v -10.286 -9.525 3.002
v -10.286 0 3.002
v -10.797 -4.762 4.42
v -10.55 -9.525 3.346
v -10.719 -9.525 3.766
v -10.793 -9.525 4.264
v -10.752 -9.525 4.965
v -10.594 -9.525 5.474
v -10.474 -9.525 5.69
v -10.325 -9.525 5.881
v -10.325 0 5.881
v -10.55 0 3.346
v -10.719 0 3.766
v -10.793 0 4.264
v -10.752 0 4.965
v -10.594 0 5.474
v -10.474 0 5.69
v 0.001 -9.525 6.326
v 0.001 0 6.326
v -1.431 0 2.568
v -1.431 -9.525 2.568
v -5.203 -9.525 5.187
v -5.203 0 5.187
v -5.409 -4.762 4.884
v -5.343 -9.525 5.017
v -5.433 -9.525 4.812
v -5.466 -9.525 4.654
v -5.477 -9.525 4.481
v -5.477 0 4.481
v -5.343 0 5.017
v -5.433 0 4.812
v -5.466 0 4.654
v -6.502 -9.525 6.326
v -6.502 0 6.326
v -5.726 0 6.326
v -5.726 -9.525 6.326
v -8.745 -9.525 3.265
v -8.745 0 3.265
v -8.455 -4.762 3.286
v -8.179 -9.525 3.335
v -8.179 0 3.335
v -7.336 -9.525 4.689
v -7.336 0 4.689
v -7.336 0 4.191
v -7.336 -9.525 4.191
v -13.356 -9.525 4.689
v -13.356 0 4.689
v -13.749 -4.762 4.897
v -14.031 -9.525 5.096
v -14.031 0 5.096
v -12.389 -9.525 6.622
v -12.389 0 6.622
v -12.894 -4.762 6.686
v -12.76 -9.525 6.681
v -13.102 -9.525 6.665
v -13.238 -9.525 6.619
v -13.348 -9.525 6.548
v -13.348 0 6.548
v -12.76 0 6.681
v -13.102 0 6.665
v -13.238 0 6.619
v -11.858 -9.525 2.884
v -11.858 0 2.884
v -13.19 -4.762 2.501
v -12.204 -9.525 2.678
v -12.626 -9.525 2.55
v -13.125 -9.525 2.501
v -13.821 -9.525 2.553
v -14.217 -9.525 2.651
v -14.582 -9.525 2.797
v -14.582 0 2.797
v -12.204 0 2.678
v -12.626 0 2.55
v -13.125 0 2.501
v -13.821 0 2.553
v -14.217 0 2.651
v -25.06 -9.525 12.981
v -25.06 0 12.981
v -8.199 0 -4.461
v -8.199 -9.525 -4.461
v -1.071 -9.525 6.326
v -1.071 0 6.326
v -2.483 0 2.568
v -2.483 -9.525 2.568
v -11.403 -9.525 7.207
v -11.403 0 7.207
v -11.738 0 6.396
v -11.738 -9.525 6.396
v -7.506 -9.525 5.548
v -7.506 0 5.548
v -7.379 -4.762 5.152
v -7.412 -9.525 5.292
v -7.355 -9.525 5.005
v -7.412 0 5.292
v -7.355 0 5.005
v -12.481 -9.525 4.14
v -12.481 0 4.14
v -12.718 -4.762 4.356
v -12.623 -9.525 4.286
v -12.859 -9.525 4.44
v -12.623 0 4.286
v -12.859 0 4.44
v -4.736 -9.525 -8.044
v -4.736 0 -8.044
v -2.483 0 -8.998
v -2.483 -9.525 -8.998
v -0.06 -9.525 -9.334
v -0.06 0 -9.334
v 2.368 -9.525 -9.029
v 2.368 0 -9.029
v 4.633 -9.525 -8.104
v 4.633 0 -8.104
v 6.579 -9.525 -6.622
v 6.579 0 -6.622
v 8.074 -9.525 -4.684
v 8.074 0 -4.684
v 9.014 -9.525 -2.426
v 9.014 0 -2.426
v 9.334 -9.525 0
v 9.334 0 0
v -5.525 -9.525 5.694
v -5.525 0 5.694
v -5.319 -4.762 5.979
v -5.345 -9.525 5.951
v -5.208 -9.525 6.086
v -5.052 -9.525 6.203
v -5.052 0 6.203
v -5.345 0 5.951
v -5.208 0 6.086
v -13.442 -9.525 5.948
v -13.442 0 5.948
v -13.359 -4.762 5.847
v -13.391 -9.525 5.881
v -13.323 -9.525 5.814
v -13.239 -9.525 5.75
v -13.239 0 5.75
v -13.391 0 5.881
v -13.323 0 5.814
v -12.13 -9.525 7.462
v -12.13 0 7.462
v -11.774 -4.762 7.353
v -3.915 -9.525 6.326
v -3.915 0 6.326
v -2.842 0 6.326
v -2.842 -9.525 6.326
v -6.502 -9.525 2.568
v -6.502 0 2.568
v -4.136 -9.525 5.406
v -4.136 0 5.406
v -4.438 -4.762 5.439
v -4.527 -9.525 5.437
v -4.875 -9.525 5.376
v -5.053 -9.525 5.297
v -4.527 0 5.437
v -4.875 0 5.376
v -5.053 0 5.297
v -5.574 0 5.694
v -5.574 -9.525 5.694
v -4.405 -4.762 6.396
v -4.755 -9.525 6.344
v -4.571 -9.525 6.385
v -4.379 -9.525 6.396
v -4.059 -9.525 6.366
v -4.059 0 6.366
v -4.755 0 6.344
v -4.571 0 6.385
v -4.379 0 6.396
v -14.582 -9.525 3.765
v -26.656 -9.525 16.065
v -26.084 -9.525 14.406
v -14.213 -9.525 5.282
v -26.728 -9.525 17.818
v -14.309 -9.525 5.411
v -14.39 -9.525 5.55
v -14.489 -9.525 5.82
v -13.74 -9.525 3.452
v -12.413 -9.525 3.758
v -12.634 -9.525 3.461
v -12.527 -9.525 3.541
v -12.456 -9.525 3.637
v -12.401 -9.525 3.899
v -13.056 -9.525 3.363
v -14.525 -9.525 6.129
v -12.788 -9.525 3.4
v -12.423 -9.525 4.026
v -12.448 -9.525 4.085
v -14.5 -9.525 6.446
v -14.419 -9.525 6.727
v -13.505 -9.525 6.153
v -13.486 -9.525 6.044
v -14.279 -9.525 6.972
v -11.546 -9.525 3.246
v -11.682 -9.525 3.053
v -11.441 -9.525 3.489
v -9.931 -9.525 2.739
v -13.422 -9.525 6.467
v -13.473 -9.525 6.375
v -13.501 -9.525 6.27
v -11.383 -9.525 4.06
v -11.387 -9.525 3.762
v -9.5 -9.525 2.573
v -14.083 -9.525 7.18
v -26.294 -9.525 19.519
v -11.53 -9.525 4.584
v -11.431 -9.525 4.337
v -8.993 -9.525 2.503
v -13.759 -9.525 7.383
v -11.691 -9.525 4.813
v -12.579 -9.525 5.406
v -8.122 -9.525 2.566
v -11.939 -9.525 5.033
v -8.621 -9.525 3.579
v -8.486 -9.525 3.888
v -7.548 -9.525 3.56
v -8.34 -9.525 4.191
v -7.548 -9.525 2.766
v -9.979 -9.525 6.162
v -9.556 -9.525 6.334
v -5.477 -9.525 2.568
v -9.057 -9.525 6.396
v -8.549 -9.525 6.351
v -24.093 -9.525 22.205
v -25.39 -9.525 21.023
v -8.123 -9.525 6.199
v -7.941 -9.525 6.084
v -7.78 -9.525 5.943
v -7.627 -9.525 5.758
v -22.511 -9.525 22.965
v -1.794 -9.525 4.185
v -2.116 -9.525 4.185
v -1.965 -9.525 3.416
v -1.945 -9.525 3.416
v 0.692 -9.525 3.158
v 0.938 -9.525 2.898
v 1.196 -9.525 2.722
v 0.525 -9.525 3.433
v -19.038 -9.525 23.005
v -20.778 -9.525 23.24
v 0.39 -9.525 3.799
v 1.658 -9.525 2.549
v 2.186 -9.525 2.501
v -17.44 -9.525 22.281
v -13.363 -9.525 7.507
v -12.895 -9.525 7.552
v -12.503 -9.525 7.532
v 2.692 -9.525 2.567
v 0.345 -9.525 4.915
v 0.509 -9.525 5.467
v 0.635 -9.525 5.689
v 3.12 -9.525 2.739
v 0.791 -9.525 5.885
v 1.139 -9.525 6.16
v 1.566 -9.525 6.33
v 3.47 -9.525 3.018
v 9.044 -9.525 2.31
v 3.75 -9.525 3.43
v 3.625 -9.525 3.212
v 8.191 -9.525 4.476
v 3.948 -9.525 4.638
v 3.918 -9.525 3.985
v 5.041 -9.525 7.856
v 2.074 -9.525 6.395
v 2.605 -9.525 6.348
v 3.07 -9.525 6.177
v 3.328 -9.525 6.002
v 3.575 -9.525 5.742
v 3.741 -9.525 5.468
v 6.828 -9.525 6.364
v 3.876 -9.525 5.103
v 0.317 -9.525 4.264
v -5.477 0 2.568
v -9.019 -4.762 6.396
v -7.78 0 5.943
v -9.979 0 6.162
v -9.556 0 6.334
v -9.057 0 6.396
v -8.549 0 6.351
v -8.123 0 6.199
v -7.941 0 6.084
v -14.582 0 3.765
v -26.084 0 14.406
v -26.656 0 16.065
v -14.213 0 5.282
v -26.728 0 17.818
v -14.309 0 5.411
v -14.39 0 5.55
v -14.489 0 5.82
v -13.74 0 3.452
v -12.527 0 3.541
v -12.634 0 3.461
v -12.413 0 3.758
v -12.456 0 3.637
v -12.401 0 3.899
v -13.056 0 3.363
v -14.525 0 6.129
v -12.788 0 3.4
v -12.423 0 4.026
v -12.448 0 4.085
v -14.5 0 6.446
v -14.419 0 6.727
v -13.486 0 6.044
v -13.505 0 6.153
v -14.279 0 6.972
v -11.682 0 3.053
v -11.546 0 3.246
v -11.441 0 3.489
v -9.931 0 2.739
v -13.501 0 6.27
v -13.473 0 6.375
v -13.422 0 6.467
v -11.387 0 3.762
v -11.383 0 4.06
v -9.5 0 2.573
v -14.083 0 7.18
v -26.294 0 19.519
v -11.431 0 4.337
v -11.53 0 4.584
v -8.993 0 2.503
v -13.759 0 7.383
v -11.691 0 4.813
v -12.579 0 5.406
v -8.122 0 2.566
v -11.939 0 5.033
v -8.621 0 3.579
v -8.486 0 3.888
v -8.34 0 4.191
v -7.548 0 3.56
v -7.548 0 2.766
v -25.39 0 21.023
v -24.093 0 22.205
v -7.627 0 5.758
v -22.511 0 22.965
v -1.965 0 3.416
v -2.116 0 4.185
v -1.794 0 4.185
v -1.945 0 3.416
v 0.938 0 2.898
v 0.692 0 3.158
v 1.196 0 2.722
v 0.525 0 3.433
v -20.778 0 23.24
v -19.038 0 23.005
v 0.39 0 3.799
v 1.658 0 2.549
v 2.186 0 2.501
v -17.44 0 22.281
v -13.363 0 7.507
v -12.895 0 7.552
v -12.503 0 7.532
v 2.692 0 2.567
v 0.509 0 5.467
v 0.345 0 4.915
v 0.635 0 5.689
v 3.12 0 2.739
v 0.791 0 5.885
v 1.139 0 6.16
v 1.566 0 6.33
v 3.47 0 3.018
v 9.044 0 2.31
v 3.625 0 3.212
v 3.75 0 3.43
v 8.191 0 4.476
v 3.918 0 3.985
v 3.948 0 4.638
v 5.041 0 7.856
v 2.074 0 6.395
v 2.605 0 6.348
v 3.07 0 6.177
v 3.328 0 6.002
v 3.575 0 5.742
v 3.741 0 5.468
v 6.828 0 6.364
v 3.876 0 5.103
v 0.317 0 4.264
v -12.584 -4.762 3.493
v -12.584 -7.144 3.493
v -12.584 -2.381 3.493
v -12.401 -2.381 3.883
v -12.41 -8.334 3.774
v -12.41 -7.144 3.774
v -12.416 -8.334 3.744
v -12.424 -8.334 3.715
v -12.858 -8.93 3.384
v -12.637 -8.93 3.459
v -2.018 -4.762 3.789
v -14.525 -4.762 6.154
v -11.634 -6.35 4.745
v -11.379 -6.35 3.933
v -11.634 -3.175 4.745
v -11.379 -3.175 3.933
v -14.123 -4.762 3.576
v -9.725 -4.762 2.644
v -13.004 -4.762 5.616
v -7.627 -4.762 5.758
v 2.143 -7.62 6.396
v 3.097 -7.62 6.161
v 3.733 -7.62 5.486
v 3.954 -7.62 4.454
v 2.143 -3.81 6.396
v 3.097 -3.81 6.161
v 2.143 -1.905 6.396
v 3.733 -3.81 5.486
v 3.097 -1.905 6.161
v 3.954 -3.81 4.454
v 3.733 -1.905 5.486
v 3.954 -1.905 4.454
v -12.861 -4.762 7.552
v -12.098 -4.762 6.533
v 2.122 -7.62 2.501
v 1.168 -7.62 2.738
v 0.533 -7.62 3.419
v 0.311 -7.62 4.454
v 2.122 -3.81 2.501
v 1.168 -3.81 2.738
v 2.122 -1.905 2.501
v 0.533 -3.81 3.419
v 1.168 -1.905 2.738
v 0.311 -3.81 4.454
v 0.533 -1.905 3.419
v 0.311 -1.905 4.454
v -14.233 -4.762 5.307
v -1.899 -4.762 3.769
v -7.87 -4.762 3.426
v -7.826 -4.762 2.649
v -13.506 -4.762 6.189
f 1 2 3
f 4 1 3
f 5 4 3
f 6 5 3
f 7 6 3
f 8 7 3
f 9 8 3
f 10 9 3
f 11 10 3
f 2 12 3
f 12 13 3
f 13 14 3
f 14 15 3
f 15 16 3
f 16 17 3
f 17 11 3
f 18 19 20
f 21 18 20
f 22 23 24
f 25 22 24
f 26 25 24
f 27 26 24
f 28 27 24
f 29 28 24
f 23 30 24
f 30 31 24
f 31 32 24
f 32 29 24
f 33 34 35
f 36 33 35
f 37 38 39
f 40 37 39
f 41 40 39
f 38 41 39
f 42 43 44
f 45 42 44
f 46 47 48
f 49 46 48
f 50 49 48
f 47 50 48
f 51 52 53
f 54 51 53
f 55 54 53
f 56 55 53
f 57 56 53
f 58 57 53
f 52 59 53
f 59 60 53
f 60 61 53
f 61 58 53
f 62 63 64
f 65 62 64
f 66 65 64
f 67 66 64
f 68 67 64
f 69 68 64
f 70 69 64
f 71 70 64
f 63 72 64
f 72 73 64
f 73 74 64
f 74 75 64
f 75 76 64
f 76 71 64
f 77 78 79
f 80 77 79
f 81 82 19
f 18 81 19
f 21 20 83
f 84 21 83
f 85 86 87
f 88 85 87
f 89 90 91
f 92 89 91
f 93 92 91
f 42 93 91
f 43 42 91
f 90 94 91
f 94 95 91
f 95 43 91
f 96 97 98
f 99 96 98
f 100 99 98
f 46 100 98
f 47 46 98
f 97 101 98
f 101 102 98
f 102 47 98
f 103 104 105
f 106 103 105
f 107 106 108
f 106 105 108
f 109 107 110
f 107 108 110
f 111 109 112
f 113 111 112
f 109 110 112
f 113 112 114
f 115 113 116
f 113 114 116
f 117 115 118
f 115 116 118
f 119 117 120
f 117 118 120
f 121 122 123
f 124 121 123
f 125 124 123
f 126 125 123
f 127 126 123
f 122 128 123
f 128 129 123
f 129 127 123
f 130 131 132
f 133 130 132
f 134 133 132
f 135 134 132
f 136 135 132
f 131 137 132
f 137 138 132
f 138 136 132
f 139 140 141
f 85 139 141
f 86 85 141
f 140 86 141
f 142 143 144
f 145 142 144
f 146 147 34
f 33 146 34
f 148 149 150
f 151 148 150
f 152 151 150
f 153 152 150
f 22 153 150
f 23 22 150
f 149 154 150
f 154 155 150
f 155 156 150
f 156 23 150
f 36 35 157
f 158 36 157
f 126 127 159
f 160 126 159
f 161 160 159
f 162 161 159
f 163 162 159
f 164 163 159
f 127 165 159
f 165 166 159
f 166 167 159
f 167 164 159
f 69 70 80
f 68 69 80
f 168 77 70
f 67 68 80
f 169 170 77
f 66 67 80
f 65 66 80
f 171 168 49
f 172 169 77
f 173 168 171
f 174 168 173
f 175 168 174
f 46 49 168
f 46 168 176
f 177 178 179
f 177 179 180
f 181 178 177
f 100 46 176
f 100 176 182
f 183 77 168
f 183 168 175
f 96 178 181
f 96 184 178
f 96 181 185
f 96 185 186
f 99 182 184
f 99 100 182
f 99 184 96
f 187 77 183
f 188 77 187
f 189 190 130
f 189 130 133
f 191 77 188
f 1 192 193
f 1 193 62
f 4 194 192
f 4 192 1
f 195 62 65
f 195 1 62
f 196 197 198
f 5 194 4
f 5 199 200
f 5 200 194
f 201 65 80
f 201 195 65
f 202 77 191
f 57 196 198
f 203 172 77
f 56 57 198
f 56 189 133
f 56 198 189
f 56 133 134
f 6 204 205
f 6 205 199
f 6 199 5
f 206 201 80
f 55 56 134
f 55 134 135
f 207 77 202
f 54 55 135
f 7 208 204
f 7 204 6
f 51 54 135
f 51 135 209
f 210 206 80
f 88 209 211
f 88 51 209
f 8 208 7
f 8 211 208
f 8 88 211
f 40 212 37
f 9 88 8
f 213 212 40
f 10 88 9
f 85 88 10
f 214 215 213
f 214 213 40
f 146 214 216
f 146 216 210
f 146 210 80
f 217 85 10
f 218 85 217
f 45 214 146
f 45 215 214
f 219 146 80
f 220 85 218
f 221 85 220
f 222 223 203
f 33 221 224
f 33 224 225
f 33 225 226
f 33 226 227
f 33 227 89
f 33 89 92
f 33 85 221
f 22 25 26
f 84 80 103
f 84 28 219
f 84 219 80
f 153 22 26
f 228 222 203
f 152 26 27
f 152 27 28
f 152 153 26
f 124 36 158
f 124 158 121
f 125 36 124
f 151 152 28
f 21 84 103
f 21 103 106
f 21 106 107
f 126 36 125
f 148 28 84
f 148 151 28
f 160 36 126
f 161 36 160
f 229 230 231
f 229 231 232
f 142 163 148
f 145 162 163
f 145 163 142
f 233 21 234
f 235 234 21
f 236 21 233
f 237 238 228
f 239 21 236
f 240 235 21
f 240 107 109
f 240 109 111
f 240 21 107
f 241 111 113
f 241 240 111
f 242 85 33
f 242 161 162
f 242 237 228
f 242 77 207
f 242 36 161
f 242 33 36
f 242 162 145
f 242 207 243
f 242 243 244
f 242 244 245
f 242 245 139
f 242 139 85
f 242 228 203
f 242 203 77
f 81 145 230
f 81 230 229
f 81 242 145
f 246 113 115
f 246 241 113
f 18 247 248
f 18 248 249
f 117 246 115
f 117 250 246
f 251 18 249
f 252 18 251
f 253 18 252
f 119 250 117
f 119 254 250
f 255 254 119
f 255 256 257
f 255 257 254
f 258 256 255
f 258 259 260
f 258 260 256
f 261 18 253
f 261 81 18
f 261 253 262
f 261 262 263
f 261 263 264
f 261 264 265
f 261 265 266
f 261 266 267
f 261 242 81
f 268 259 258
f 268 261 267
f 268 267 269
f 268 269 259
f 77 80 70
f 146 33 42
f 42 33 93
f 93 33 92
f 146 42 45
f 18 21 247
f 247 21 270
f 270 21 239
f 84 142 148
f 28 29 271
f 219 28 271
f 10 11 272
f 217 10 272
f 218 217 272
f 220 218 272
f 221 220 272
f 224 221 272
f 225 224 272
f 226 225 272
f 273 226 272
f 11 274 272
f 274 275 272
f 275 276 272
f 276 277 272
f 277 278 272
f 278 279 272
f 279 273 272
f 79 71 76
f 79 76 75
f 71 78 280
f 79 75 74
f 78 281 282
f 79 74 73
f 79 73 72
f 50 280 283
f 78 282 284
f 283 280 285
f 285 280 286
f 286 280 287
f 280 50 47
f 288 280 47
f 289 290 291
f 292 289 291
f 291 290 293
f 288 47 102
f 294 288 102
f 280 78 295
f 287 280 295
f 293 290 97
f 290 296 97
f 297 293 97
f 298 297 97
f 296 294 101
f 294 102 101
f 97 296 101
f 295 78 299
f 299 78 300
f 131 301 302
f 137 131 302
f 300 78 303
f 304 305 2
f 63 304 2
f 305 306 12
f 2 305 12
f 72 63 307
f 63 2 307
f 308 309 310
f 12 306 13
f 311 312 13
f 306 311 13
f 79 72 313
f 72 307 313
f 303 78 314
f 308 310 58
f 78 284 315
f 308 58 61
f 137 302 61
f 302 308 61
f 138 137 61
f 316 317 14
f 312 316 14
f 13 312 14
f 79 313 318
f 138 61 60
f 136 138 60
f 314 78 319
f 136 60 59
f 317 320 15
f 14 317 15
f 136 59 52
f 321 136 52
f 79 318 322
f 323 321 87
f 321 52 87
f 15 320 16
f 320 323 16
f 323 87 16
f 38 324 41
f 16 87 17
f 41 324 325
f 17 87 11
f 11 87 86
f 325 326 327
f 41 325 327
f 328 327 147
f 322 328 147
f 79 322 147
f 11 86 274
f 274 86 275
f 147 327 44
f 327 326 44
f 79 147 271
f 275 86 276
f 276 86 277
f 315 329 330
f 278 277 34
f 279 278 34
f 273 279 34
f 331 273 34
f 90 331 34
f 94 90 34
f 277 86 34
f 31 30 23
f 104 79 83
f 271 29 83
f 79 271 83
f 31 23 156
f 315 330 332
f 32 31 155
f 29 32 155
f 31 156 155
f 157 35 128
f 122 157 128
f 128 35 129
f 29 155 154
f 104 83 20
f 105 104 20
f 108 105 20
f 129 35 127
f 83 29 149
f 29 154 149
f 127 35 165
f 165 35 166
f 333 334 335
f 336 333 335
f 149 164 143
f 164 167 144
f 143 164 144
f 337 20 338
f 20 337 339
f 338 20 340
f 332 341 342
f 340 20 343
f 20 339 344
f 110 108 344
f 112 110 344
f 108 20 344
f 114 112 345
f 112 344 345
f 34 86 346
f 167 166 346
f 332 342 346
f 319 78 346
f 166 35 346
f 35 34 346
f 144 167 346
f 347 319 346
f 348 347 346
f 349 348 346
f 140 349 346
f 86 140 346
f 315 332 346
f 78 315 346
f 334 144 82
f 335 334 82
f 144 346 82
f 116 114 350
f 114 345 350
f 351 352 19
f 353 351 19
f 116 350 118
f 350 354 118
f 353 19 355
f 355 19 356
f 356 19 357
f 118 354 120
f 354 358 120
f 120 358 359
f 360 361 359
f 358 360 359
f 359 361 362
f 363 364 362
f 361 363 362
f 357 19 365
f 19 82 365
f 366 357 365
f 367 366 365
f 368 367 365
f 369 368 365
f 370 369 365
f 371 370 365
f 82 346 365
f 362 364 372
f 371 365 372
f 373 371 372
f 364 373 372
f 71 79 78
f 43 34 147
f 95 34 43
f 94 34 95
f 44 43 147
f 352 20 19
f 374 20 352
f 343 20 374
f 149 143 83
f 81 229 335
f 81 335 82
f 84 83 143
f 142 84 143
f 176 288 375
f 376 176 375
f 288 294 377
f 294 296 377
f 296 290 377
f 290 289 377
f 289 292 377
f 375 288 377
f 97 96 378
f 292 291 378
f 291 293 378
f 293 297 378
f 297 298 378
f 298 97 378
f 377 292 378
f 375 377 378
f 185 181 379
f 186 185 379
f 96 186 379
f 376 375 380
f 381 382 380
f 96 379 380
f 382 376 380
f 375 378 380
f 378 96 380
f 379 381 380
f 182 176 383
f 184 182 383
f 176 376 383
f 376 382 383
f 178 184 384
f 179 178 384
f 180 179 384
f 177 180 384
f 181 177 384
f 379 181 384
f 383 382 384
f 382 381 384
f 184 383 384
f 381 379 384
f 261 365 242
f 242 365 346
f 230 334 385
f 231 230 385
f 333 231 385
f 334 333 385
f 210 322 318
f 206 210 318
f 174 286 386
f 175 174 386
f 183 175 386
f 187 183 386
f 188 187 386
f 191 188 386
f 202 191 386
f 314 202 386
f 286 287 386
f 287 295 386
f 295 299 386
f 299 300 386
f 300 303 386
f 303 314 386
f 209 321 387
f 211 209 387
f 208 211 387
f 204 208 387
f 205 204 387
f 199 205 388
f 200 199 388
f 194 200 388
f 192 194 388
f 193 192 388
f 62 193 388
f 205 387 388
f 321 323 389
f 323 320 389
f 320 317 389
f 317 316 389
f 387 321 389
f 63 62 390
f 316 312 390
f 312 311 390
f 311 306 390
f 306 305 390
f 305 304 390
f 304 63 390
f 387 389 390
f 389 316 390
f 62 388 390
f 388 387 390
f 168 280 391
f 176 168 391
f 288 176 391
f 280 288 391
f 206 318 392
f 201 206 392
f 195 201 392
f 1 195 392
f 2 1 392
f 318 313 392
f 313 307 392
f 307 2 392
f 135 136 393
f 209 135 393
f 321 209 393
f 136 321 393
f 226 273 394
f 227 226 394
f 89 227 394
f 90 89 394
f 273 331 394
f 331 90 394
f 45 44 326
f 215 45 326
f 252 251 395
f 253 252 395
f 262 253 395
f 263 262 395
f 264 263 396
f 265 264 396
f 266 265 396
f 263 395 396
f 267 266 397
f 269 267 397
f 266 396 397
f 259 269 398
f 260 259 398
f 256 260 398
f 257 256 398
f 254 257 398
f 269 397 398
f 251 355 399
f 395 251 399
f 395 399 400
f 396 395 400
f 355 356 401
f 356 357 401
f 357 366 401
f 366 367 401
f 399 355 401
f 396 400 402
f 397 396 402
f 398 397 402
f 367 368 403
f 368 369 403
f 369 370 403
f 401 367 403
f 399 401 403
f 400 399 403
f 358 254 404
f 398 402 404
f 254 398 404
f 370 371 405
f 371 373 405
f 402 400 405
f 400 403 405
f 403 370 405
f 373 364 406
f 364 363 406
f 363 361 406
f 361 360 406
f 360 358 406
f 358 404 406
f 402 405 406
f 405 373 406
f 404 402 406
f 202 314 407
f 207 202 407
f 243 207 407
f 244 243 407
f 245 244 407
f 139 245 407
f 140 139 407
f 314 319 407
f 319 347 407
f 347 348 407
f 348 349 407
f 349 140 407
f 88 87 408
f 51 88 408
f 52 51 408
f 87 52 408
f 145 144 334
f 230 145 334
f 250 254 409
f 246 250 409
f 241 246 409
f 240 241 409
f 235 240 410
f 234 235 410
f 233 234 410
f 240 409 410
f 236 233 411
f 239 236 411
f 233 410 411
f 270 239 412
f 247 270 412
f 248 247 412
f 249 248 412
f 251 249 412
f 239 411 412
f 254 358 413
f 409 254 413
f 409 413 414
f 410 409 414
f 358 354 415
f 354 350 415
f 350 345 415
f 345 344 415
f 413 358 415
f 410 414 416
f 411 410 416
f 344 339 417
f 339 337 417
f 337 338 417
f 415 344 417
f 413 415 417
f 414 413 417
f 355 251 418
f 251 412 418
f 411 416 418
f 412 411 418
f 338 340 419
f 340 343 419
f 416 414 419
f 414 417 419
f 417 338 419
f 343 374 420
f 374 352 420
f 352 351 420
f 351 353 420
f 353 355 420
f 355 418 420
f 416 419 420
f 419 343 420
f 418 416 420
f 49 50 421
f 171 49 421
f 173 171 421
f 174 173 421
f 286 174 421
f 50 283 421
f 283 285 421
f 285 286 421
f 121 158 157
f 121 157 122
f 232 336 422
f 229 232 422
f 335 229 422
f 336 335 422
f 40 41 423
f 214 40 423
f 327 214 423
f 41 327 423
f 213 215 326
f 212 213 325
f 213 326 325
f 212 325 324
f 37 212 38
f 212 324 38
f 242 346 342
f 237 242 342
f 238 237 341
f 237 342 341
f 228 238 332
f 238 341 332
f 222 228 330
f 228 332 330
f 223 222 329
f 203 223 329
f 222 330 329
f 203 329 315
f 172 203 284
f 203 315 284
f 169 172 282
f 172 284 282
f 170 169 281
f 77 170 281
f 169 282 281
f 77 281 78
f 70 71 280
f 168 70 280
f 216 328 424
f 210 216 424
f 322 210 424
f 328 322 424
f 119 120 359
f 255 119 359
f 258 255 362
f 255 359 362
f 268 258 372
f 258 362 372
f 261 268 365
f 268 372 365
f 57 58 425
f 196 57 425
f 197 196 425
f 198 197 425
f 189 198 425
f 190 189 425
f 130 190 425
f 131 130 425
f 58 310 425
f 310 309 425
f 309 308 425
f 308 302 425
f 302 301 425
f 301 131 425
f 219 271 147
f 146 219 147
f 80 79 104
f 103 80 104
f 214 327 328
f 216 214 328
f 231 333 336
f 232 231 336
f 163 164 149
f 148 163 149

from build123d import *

# Parameters (mm, degrees)
F1_DEPTH = 9.525


with BuildPart() as f1:
    # F0 (on Front) → F1 (new body)
    with BuildSketch(Plane.XZ):
        with BuildLine():
            ThreePointArc((-7.5064634302, 5.5483481321), (-1.6884786167, 9.1804248368), (5.0410928398, 7.8561150198))
            Line((5.0410928398, 7.8561150198), (-17.4395217917, 22.2814213152))
            ThreePointArc((-17.4395217917, 22.2814213152), (-15.3970130347, 20.0899078742), (-14.655637054, 17.1873340441))
            ThreePointArc((-14.655637054, 17.1873340441), (-18.4394665066, 11.5760064467), (-25.0600108779, 12.9805544023))
            Line((-25.0600108779, 12.9805544023), (-8.1994643326, -4.4609354268))
            ThreePointArc((-8.1994643326, -4.4609354268), (-9.2744575004, -1.0562188677), (-8.9925532114, 2.5030275596))
            add(Edge.make_bspline(
                [(-8.9925532114, 2.5030275596), (-9.810689736, 2.5354179302), (-10.2860927177, 3.0018132764)],
                knots=[0.0694483143, 0.0694483143, 0.0694483143, 1, 1, 1], degree=2))
            add(Edge.make_bspline(
                [(-10.2860927177, 3.0018132764), (-10.7969756583, 3.5030163297), (-10.7969756583, 4.4204545369)],
                knots=[0, 0, 0, 1, 1, 1], degree=2))
            add(Edge.make_bspline(
                [(-10.7969756583, 4.4204545369), (-10.7969756583, 5.3647813198), (-10.3248122669, 5.8805042041)],
                knots=[0, 0, 0, 1, 1, 1], degree=2))
            add(Edge.make_bspline(
                [(-10.3248122669, 5.8805042041), (-9.8526488754, 6.3962270884), (-9.0191030248, 6.3962270884)],
                knots=[0, 0, 0, 1, 1, 1], degree=2))
            add(Edge.make_bspline(
                [(-9.0191030248, 6.3962270884), (-8.2232011804, 6.3962270884), (-7.7795396793, 5.9428857)],
                knots=[0, 0, 0, 1, 1, 1], degree=2))
            add(Edge.make_bspline(
                [(-7.7795396793, 5.9428857), (-7.6109819931, 5.7706503915), (-7.5064634302, 5.5483481321)],
                knots=[0, 0, 0, 0.3799240768, 0.3799240768, 0.3799240768], degree=2))
        make_face()
        with BuildLine():
            add(Edge.make_bspline(
                [(-11.6342859095, 4.7447307613), (-11.3788444392, 4.4140012787), (-11.3788444392, 3.9332335429)],
                knots=[0, 0, 0, 1, 1, 1], degree=2))
            add(Edge.make_bspline(
                [(-11.3788444392, 3.9332335429), (-11.3788444392, 3.2674724055), (-11.8579988603, 2.8840413143)],
                knots=[0, 0, 0, 1, 1, 1], degree=2))
            add(Edge.make_bspline(
                [(-11.8579988603, 2.8840413143), (-12.3371532815, 2.500610223), (-13.1900589067, 2.500610223)],
                knots=[0, 0, 0, 1, 1, 1], degree=2))
            add(Edge.make_bspline(
                [(-13.1900589067, 2.500610223), (-13.9773564068, 2.500610223), (-14.5818115913, 2.7974601001)],
                knots=[0, 0, 0, 1, 1, 1], degree=2))
            Line((-14.5818115913, 2.7974601001), (-14.5818115913, 3.7654488298))
            add(Edge.make_bspline(
                [(-14.5818115913, 3.7654488298), (-14.0849107101, 3.542811422), (-13.740199168, 3.4524658072)],
                knots=[0, 0, 0, 1, 1, 1], degree=2))
            add(Edge.make_bspline(
                [(-13.740199168, 3.4524658072), (-13.395487626, 3.3621201924), (-13.1093931792, 3.3621201924)],
                knots=[0, 0, 0, 1, 1, 1], degree=2))
            add(Edge.make_bspline(
                [(-13.1093931792, 3.3621201924), (-12.7673704947, 3.3621201924), (-12.5839904076, 3.4927986709)],
                knots=[0, 0, 0, 1, 1, 1], degree=2))
            add(Edge.make_bspline(
                [(-12.5839904076, 3.4927986709), (-12.4006103205, 3.6234771494), (-12.4006103205, 3.8826830204)],
                knots=[0, 0, 0, 1, 1, 1], degree=2))
            add(Edge.make_bspline(
                [(-12.4006103205, 3.8826830204), (-12.4006103205, 4.0268057868), (-12.4812760479, 4.1397378053)],
                knots=[0, 0, 0, 1, 1, 1], degree=2))
            add(Edge.make_bspline(
                [(-12.4812760479, 4.1397378053), (-12.5619417754, 4.2526698237), (-12.7184332867, 4.3564597264)],
                knots=[0, 0, 0, 1, 1, 1], degree=2))
            add(Edge.make_bspline(
                [(-12.7184332867, 4.3564597264), (-12.874924798, 4.4602496291), (-13.3556925337, 4.6893402951)],
                knots=[0, 0, 0, 1, 1, 1], degree=2))
            add(Edge.make_bspline(
                [(-13.3556925337, 4.6893402951), (-13.8052695215, 4.9012222726), (-14.0305957869, 5.0958955616)],
                knots=[0, 0, 0, 1, 1, 1], degree=2))
            add(Edge.make_bspline(
                [(-14.0305957869, 5.0958955616), (-14.2559220523, 5.2905688505), (-14.3903649315, 5.5497747215)],
                knots=[0, 0, 0, 1, 1, 1], degree=2))
            add(Edge.make_bspline(
                [(-14.3903649315, 5.5497747215), (-14.5248078106, 5.8089805924), (-14.5248078106, 6.154229906)],
                knots=[0, 0, 0, 1, 1, 1], degree=2))
            add(Edge.make_bspline(
                [(-14.5248078106, 6.154229906), (-14.5248078106, 6.807084527), (-14.082759624, 7.1797601879)],
                knots=[0, 0, 0, 1, 1, 1], degree=2))
            add(Edge.make_bspline(
                [(-14.082759624, 7.1797601879), (-13.6407114375, 7.5524358489), (-12.8609427386, 7.5524358489)],
                knots=[0, 0, 0, 1, 1, 1], degree=2))
            add(Edge.make_bspline(
                [(-12.8609427386, 7.5524358489), (-12.4780494188, 7.5524358489), (-12.1301112477, 7.4620902341)],
                knots=[0, 0, 0, 1, 1, 1], degree=2))
            add(Edge.make_bspline(
                [(-12.1301112477, 7.4620902341), (-11.7821730765, 7.3717446193), (-11.4025063859, 7.2071865353)],
                knots=[0, 0, 0, 1, 1, 1], degree=2))
            Line((-11.4025063859, 7.2071865353), (-11.7380758122, 6.3962270884))
            add(Edge.make_bspline(
                [(-11.7380758122, 6.3962270884), (-12.1317245622, 6.5575585434), (-12.3887793471, 6.6215533538)],
                knots=[0, 0, 0, 1, 1, 1], degree=2))
            add(Edge.make_bspline(
                [(-12.3887793471, 6.6215533538), (-12.645834132, 6.6855481643), (-12.8942845726, 6.6855481643)],
                knots=[0, 0, 0, 1, 1, 1], degree=2))
            add(Edge.make_bspline(
                [(-12.8942845726, 6.6855481643), (-13.1900589067, 6.6855481643), (-13.3481637325, 6.5478786561)],
                knots=[0, 0, 0, 1, 1, 1], degree=2))
            add(Edge.make_bspline(
                [(-13.3481637325, 6.5478786561), (-13.5062685584, 6.4102091478), (-13.5062685584, 6.1886472831)],
                knots=[0, 0, 0, 1, 1, 1], degree=2))
            add(Edge.make_bspline(
                [(-13.5062685584, 6.1886472831), (-13.5062685584, 6.0509777748), (-13.4422737479, 5.9482634152)],
                knots=[0, 0, 0, 1, 1, 1], degree=2))
            add(Edge.make_bspline(
                [(-13.4422737479, 5.9482634152), (-13.3782789374, 5.8455490555), (-13.2389961147, 5.7498257256)],
                knots=[0, 0, 0, 1, 1, 1], degree=2))
            add(Edge.make_bspline(
                [(-13.2389961147, 5.7498257256), (-13.0997132919, 5.6541023957), (-12.5791504639, 5.4056519551)],
                knots=[0, 0, 0, 1, 1, 1], degree=2))
            add(Edge.make_bspline(
                [(-12.5791504639, 5.4056519551), (-11.8897273798, 5.0754602439), (-11.6342859095, 4.7447307613)],
                knots=[0, 0, 0, 1, 1, 1], degree=2))
        make_face(mode=Mode.SUBTRACT)
        with BuildLine():
            ThreePointArc((-14.655637054, 17.1873340441), (-15.3970130347, 20.0899078742), (-17.4395217917, 22.2814213152))
            ThreePointArc((-17.4395217917, 22.2814213152), (-25.3901350407, 21.0233205124), (-25.0600108779, 12.9805544023))
            ThreePointArc((-25.0600108779, 12.9805544023), (-18.4394665066, 11.5760064467), (-14.655637054, 17.1873340441))
        make_face()
        with BuildLine():
            ThreePointArc((-4.7360316081, -8.0437034276), (4.6326618731, -8.103678436), (9.3344073312, 0))
            ThreePointArc((9.3344073312, 0), (8.19105531, 4.4763571274), (5.0410928398, 7.8561150198))
            ThreePointArc((5.0410928398, 7.8561150198), (-1.6884786167, 9.1804248368), (-7.5064634302, 5.5483481321))
            add(Edge.make_bspline(
                [(-7.5064634302, 5.5483481321), (-7.3358781782, 5.1855275394), (-7.3358781782, 4.6893402951)],
                knots=[0.3799240768, 0.3799240768, 0.3799240768, 1, 1, 1], degree=2))
            Line((-7.3358781782, 4.6893402951), (-7.3358781782, 4.1913638708))
            Line((-7.3358781782, 4.1913638708), (-8.3404813486, 4.1913638708))
            ThreePointArc((-8.3404813486, 4.1913638708), (-8.5551395781, 3.7337309789), (-8.7447104606, 3.2651491826))
            add(Edge.make_bspline(
                [(-8.7447104606, 3.2651491826), (-8.4471066944, 3.2722234466), (-8.1791039161, 3.3346938451)],
                knots=[0.1132418576, 0.1132418576, 0.1132418576, 1, 1, 1], degree=2))
            add(Edge.make_bspline(
                [(-8.1791039161, 3.3346938451), (-7.8768763238, 3.4051419137), (-7.5477601557, 3.5600201105)],
                knots=[0, 0, 0, 1, 1, 1], degree=2))
            Line((-7.5477601557, 3.5600201105), (-7.5477601557, 2.7662693522))
            add(Edge.make_bspline(
                [(-7.5477601557, 2.7662693522), (-7.816645914, 2.631826473), (-8.1221001353, 2.566218348)],
                knots=[0, 0, 0, 1, 1, 1], degree=2))
            add(Edge.make_bspline(
                [(-8.1221001353, 2.566218348), (-8.4275543567, 2.500610223), (-8.8685270002, 2.500610223)],
                knots=[0, 0, 0, 1, 1, 1], degree=2))
            add(Edge.make_bspline(
                [(-8.8685270002, 2.500610223), (-8.9314945906, 2.500610223), (-8.9925532114, 2.5030275596)],
                knots=[0, 0, 0, 0.0694483143, 0.0694483143, 0.0694483143], degree=2))
            ThreePointArc((-8.9925532114, 2.5030275596), (-9.2744575004, -1.0562188677), (-8.1994643326, -4.4609354268))
            Line((-8.1994643326, -4.4609354268), (-4.7360316081, -8.0437034276))
        make_face()
        with BuildLine():
            add(Edge.make_bspline(
                [(-5.0519625477, 6.203167114), (-4.7545748991, 6.3962270884), (-4.4050234134, 6.3962270884)],
                knots=[0, 0, 0, 1, 1, 1], degree=2))
            add(Edge.make_bspline(
                [(-4.4050234134, 6.3962270884), (-4.196368065, 6.3962270884), (-4.0586985568, 6.3661118835)],
                knots=[0, 0, 0, 1, 1, 1], degree=2))
            Line((-4.0586985568, 6.3661118835), (-4.1361376552, 5.4056519551))
            add(Edge.make_bspline(
                [(-4.1361376552, 5.4056519551), (-4.260900647, 5.4389937891), (-4.4383652474, 5.4389937891)],
                knots=[0, 0, 0, 1, 1, 1], degree=2))
            add(Edge.make_bspline(
                [(-4.4383652474, 5.4389937891), (-4.9288128705, 5.4389937891), (-5.2030763439, 5.1867789478)],
                knots=[0, 0, 0, 1, 1, 1], degree=2))
            add(Edge.make_bspline(
                [(-5.2030763439, 5.1867789478), (-5.4773398173, 4.9345641066), (-5.4773398173, 4.4806849467)],
                knots=[0, 0, 0, 1, 1, 1], degree=2))
            Line((-5.4773398173, 4.4806849467), (-5.4773398173, 2.5683694341))
            Line((-5.4773398173, 2.5683694341), (-6.5023323277, 2.5683694341))
            Line((-6.5023323277, 2.5683694341), (-6.5023323277, 6.3263167913))
            Line((-6.5023323277, 6.3263167913), (-5.7257902579, 6.3263167913))
            Line((-5.7257902579, 6.3263167913), (-5.5741386903, 5.6938974879))
            Line((-5.5741386903, 5.6938974879), (-5.5246637107, 5.6938974879))
            add(Edge.make_bspline(
                [(-5.5246637107, 5.6938974879), (-5.3493501964, 6.0101071396), (-5.0519625477, 6.203167114)],
                knots=[0, 0, 0, 1, 1, 1], degree=2))
        make_face(mode=Mode.SUBTRACT)
        with BuildLine():
            Line((-1.4311469273, 2.5683694341), (-2.4830280135, 2.5683694341))
            Line((-2.4830280135, 2.5683694341), (-3.9145757904, 6.3263167913))
            Line((-3.9145757904, 6.3263167913), (-2.8422593865, 6.3263167913))
            Line((-2.8422593865, 6.3263167913), (-2.1162678393, 4.1849106126))
            add(Edge.make_bspline(
                [(-2.1162678393, 4.1849106126), (-1.9958070196, 3.7783553462), (-1.9646162716, 3.4158973441)],
                knots=[0, 0, 0, 1, 1, 1], degree=2))
            Line((-1.9646162716, 3.4158973441), (-1.945256497, 3.4158973441))
            add(Edge.make_bspline(
                [(-1.945256497, 3.4158973441), (-1.9280478085, 3.738560254), (-1.7936049294, 4.1849106126)],
                knots=[0, 0, 0, 1, 1, 1], degree=2))
            Line((-1.7936049294, 4.1849106126), (-1.0708400112, 6.3263167913))
            Line((-1.0708400112, 6.3263167913), (0.0014763926, 6.3263167913))
            Line((0.0014763926, 6.3263167913), (-1.4311469273, 2.5683694341))
        make_face(mode=Mode.SUBTRACT)
        with BuildLine():
            add(Edge.make_bspline(
                [(3.732535174, 5.485779911), (3.9540970388, 5.045345039), (3.9540970388, 4.4537963709)],
                knots=[0, 0, 0, 1, 1, 1], degree=2))
            add(Edge.make_bspline(
                [(3.9540970388, 4.4537963709), (3.9540970388, 3.5363581638), (3.4701026739, 3.0184841934)],
                knots=[0, 0, 0, 1, 1, 1], degree=2))
            add(Edge.make_bspline(
                [(3.4701026739, 3.0184841934), (2.9861083091, 2.500610223), (2.1224472536, 2.500610223)],
                knots=[0, 0, 0, 1, 1, 1], degree=2))
            add(Edge.make_bspline(
                [(2.1224472536, 2.500610223), (1.5814491081, 2.500610223), (1.1679028119, 2.7377674618)],
                knots=[0, 0, 0, 1, 1, 1], degree=2))
            add(Edge.make_bspline(
                [(1.1679028119, 2.7377674618), (0.7543565157, 2.9749247006), (0.5327946509, 3.4185862017)],
                knots=[0, 0, 0, 1, 1, 1], degree=2))
            add(Edge.make_bspline(
                [(0.5327946509, 3.4185862017), (0.3112327861, 3.8622477028), (0.3112327861, 4.4537963709)],
                knots=[0, 0, 0, 1, 1, 1], degree=2))
            add(Edge.make_bspline(
                [(0.3112327861, 4.4537963709), (0.3112327861, 5.3744612071), (0.7914627503, 5.8853441478)],
                knots=[0, 0, 0, 1, 1, 1], degree=2))
            add(Edge.make_bspline(
                [(0.7914627503, 5.8853441478), (1.2716927146, 6.3962270884), (2.1428825713, 6.3962270884)],
                knots=[0, 0, 0, 1, 1, 1], degree=2))
            add(Edge.make_bspline(
                [(2.1428825713, 6.3962270884), (2.6838807168, 6.3962270884), (3.097427013, 6.1612209357)],
                knots=[0, 0, 0, 1, 1, 1], degree=2))
            add(Edge.make_bspline(
                [(3.097427013, 6.1612209357), (3.5109733092, 5.926214783), (3.732535174, 5.485779911)],
                knots=[0, 0, 0, 1, 1, 1], degree=2))
        make_face(mode=Mode.SUBTRACT)
    extrude(amount=F1_DEPTH)


solid = f1.part
